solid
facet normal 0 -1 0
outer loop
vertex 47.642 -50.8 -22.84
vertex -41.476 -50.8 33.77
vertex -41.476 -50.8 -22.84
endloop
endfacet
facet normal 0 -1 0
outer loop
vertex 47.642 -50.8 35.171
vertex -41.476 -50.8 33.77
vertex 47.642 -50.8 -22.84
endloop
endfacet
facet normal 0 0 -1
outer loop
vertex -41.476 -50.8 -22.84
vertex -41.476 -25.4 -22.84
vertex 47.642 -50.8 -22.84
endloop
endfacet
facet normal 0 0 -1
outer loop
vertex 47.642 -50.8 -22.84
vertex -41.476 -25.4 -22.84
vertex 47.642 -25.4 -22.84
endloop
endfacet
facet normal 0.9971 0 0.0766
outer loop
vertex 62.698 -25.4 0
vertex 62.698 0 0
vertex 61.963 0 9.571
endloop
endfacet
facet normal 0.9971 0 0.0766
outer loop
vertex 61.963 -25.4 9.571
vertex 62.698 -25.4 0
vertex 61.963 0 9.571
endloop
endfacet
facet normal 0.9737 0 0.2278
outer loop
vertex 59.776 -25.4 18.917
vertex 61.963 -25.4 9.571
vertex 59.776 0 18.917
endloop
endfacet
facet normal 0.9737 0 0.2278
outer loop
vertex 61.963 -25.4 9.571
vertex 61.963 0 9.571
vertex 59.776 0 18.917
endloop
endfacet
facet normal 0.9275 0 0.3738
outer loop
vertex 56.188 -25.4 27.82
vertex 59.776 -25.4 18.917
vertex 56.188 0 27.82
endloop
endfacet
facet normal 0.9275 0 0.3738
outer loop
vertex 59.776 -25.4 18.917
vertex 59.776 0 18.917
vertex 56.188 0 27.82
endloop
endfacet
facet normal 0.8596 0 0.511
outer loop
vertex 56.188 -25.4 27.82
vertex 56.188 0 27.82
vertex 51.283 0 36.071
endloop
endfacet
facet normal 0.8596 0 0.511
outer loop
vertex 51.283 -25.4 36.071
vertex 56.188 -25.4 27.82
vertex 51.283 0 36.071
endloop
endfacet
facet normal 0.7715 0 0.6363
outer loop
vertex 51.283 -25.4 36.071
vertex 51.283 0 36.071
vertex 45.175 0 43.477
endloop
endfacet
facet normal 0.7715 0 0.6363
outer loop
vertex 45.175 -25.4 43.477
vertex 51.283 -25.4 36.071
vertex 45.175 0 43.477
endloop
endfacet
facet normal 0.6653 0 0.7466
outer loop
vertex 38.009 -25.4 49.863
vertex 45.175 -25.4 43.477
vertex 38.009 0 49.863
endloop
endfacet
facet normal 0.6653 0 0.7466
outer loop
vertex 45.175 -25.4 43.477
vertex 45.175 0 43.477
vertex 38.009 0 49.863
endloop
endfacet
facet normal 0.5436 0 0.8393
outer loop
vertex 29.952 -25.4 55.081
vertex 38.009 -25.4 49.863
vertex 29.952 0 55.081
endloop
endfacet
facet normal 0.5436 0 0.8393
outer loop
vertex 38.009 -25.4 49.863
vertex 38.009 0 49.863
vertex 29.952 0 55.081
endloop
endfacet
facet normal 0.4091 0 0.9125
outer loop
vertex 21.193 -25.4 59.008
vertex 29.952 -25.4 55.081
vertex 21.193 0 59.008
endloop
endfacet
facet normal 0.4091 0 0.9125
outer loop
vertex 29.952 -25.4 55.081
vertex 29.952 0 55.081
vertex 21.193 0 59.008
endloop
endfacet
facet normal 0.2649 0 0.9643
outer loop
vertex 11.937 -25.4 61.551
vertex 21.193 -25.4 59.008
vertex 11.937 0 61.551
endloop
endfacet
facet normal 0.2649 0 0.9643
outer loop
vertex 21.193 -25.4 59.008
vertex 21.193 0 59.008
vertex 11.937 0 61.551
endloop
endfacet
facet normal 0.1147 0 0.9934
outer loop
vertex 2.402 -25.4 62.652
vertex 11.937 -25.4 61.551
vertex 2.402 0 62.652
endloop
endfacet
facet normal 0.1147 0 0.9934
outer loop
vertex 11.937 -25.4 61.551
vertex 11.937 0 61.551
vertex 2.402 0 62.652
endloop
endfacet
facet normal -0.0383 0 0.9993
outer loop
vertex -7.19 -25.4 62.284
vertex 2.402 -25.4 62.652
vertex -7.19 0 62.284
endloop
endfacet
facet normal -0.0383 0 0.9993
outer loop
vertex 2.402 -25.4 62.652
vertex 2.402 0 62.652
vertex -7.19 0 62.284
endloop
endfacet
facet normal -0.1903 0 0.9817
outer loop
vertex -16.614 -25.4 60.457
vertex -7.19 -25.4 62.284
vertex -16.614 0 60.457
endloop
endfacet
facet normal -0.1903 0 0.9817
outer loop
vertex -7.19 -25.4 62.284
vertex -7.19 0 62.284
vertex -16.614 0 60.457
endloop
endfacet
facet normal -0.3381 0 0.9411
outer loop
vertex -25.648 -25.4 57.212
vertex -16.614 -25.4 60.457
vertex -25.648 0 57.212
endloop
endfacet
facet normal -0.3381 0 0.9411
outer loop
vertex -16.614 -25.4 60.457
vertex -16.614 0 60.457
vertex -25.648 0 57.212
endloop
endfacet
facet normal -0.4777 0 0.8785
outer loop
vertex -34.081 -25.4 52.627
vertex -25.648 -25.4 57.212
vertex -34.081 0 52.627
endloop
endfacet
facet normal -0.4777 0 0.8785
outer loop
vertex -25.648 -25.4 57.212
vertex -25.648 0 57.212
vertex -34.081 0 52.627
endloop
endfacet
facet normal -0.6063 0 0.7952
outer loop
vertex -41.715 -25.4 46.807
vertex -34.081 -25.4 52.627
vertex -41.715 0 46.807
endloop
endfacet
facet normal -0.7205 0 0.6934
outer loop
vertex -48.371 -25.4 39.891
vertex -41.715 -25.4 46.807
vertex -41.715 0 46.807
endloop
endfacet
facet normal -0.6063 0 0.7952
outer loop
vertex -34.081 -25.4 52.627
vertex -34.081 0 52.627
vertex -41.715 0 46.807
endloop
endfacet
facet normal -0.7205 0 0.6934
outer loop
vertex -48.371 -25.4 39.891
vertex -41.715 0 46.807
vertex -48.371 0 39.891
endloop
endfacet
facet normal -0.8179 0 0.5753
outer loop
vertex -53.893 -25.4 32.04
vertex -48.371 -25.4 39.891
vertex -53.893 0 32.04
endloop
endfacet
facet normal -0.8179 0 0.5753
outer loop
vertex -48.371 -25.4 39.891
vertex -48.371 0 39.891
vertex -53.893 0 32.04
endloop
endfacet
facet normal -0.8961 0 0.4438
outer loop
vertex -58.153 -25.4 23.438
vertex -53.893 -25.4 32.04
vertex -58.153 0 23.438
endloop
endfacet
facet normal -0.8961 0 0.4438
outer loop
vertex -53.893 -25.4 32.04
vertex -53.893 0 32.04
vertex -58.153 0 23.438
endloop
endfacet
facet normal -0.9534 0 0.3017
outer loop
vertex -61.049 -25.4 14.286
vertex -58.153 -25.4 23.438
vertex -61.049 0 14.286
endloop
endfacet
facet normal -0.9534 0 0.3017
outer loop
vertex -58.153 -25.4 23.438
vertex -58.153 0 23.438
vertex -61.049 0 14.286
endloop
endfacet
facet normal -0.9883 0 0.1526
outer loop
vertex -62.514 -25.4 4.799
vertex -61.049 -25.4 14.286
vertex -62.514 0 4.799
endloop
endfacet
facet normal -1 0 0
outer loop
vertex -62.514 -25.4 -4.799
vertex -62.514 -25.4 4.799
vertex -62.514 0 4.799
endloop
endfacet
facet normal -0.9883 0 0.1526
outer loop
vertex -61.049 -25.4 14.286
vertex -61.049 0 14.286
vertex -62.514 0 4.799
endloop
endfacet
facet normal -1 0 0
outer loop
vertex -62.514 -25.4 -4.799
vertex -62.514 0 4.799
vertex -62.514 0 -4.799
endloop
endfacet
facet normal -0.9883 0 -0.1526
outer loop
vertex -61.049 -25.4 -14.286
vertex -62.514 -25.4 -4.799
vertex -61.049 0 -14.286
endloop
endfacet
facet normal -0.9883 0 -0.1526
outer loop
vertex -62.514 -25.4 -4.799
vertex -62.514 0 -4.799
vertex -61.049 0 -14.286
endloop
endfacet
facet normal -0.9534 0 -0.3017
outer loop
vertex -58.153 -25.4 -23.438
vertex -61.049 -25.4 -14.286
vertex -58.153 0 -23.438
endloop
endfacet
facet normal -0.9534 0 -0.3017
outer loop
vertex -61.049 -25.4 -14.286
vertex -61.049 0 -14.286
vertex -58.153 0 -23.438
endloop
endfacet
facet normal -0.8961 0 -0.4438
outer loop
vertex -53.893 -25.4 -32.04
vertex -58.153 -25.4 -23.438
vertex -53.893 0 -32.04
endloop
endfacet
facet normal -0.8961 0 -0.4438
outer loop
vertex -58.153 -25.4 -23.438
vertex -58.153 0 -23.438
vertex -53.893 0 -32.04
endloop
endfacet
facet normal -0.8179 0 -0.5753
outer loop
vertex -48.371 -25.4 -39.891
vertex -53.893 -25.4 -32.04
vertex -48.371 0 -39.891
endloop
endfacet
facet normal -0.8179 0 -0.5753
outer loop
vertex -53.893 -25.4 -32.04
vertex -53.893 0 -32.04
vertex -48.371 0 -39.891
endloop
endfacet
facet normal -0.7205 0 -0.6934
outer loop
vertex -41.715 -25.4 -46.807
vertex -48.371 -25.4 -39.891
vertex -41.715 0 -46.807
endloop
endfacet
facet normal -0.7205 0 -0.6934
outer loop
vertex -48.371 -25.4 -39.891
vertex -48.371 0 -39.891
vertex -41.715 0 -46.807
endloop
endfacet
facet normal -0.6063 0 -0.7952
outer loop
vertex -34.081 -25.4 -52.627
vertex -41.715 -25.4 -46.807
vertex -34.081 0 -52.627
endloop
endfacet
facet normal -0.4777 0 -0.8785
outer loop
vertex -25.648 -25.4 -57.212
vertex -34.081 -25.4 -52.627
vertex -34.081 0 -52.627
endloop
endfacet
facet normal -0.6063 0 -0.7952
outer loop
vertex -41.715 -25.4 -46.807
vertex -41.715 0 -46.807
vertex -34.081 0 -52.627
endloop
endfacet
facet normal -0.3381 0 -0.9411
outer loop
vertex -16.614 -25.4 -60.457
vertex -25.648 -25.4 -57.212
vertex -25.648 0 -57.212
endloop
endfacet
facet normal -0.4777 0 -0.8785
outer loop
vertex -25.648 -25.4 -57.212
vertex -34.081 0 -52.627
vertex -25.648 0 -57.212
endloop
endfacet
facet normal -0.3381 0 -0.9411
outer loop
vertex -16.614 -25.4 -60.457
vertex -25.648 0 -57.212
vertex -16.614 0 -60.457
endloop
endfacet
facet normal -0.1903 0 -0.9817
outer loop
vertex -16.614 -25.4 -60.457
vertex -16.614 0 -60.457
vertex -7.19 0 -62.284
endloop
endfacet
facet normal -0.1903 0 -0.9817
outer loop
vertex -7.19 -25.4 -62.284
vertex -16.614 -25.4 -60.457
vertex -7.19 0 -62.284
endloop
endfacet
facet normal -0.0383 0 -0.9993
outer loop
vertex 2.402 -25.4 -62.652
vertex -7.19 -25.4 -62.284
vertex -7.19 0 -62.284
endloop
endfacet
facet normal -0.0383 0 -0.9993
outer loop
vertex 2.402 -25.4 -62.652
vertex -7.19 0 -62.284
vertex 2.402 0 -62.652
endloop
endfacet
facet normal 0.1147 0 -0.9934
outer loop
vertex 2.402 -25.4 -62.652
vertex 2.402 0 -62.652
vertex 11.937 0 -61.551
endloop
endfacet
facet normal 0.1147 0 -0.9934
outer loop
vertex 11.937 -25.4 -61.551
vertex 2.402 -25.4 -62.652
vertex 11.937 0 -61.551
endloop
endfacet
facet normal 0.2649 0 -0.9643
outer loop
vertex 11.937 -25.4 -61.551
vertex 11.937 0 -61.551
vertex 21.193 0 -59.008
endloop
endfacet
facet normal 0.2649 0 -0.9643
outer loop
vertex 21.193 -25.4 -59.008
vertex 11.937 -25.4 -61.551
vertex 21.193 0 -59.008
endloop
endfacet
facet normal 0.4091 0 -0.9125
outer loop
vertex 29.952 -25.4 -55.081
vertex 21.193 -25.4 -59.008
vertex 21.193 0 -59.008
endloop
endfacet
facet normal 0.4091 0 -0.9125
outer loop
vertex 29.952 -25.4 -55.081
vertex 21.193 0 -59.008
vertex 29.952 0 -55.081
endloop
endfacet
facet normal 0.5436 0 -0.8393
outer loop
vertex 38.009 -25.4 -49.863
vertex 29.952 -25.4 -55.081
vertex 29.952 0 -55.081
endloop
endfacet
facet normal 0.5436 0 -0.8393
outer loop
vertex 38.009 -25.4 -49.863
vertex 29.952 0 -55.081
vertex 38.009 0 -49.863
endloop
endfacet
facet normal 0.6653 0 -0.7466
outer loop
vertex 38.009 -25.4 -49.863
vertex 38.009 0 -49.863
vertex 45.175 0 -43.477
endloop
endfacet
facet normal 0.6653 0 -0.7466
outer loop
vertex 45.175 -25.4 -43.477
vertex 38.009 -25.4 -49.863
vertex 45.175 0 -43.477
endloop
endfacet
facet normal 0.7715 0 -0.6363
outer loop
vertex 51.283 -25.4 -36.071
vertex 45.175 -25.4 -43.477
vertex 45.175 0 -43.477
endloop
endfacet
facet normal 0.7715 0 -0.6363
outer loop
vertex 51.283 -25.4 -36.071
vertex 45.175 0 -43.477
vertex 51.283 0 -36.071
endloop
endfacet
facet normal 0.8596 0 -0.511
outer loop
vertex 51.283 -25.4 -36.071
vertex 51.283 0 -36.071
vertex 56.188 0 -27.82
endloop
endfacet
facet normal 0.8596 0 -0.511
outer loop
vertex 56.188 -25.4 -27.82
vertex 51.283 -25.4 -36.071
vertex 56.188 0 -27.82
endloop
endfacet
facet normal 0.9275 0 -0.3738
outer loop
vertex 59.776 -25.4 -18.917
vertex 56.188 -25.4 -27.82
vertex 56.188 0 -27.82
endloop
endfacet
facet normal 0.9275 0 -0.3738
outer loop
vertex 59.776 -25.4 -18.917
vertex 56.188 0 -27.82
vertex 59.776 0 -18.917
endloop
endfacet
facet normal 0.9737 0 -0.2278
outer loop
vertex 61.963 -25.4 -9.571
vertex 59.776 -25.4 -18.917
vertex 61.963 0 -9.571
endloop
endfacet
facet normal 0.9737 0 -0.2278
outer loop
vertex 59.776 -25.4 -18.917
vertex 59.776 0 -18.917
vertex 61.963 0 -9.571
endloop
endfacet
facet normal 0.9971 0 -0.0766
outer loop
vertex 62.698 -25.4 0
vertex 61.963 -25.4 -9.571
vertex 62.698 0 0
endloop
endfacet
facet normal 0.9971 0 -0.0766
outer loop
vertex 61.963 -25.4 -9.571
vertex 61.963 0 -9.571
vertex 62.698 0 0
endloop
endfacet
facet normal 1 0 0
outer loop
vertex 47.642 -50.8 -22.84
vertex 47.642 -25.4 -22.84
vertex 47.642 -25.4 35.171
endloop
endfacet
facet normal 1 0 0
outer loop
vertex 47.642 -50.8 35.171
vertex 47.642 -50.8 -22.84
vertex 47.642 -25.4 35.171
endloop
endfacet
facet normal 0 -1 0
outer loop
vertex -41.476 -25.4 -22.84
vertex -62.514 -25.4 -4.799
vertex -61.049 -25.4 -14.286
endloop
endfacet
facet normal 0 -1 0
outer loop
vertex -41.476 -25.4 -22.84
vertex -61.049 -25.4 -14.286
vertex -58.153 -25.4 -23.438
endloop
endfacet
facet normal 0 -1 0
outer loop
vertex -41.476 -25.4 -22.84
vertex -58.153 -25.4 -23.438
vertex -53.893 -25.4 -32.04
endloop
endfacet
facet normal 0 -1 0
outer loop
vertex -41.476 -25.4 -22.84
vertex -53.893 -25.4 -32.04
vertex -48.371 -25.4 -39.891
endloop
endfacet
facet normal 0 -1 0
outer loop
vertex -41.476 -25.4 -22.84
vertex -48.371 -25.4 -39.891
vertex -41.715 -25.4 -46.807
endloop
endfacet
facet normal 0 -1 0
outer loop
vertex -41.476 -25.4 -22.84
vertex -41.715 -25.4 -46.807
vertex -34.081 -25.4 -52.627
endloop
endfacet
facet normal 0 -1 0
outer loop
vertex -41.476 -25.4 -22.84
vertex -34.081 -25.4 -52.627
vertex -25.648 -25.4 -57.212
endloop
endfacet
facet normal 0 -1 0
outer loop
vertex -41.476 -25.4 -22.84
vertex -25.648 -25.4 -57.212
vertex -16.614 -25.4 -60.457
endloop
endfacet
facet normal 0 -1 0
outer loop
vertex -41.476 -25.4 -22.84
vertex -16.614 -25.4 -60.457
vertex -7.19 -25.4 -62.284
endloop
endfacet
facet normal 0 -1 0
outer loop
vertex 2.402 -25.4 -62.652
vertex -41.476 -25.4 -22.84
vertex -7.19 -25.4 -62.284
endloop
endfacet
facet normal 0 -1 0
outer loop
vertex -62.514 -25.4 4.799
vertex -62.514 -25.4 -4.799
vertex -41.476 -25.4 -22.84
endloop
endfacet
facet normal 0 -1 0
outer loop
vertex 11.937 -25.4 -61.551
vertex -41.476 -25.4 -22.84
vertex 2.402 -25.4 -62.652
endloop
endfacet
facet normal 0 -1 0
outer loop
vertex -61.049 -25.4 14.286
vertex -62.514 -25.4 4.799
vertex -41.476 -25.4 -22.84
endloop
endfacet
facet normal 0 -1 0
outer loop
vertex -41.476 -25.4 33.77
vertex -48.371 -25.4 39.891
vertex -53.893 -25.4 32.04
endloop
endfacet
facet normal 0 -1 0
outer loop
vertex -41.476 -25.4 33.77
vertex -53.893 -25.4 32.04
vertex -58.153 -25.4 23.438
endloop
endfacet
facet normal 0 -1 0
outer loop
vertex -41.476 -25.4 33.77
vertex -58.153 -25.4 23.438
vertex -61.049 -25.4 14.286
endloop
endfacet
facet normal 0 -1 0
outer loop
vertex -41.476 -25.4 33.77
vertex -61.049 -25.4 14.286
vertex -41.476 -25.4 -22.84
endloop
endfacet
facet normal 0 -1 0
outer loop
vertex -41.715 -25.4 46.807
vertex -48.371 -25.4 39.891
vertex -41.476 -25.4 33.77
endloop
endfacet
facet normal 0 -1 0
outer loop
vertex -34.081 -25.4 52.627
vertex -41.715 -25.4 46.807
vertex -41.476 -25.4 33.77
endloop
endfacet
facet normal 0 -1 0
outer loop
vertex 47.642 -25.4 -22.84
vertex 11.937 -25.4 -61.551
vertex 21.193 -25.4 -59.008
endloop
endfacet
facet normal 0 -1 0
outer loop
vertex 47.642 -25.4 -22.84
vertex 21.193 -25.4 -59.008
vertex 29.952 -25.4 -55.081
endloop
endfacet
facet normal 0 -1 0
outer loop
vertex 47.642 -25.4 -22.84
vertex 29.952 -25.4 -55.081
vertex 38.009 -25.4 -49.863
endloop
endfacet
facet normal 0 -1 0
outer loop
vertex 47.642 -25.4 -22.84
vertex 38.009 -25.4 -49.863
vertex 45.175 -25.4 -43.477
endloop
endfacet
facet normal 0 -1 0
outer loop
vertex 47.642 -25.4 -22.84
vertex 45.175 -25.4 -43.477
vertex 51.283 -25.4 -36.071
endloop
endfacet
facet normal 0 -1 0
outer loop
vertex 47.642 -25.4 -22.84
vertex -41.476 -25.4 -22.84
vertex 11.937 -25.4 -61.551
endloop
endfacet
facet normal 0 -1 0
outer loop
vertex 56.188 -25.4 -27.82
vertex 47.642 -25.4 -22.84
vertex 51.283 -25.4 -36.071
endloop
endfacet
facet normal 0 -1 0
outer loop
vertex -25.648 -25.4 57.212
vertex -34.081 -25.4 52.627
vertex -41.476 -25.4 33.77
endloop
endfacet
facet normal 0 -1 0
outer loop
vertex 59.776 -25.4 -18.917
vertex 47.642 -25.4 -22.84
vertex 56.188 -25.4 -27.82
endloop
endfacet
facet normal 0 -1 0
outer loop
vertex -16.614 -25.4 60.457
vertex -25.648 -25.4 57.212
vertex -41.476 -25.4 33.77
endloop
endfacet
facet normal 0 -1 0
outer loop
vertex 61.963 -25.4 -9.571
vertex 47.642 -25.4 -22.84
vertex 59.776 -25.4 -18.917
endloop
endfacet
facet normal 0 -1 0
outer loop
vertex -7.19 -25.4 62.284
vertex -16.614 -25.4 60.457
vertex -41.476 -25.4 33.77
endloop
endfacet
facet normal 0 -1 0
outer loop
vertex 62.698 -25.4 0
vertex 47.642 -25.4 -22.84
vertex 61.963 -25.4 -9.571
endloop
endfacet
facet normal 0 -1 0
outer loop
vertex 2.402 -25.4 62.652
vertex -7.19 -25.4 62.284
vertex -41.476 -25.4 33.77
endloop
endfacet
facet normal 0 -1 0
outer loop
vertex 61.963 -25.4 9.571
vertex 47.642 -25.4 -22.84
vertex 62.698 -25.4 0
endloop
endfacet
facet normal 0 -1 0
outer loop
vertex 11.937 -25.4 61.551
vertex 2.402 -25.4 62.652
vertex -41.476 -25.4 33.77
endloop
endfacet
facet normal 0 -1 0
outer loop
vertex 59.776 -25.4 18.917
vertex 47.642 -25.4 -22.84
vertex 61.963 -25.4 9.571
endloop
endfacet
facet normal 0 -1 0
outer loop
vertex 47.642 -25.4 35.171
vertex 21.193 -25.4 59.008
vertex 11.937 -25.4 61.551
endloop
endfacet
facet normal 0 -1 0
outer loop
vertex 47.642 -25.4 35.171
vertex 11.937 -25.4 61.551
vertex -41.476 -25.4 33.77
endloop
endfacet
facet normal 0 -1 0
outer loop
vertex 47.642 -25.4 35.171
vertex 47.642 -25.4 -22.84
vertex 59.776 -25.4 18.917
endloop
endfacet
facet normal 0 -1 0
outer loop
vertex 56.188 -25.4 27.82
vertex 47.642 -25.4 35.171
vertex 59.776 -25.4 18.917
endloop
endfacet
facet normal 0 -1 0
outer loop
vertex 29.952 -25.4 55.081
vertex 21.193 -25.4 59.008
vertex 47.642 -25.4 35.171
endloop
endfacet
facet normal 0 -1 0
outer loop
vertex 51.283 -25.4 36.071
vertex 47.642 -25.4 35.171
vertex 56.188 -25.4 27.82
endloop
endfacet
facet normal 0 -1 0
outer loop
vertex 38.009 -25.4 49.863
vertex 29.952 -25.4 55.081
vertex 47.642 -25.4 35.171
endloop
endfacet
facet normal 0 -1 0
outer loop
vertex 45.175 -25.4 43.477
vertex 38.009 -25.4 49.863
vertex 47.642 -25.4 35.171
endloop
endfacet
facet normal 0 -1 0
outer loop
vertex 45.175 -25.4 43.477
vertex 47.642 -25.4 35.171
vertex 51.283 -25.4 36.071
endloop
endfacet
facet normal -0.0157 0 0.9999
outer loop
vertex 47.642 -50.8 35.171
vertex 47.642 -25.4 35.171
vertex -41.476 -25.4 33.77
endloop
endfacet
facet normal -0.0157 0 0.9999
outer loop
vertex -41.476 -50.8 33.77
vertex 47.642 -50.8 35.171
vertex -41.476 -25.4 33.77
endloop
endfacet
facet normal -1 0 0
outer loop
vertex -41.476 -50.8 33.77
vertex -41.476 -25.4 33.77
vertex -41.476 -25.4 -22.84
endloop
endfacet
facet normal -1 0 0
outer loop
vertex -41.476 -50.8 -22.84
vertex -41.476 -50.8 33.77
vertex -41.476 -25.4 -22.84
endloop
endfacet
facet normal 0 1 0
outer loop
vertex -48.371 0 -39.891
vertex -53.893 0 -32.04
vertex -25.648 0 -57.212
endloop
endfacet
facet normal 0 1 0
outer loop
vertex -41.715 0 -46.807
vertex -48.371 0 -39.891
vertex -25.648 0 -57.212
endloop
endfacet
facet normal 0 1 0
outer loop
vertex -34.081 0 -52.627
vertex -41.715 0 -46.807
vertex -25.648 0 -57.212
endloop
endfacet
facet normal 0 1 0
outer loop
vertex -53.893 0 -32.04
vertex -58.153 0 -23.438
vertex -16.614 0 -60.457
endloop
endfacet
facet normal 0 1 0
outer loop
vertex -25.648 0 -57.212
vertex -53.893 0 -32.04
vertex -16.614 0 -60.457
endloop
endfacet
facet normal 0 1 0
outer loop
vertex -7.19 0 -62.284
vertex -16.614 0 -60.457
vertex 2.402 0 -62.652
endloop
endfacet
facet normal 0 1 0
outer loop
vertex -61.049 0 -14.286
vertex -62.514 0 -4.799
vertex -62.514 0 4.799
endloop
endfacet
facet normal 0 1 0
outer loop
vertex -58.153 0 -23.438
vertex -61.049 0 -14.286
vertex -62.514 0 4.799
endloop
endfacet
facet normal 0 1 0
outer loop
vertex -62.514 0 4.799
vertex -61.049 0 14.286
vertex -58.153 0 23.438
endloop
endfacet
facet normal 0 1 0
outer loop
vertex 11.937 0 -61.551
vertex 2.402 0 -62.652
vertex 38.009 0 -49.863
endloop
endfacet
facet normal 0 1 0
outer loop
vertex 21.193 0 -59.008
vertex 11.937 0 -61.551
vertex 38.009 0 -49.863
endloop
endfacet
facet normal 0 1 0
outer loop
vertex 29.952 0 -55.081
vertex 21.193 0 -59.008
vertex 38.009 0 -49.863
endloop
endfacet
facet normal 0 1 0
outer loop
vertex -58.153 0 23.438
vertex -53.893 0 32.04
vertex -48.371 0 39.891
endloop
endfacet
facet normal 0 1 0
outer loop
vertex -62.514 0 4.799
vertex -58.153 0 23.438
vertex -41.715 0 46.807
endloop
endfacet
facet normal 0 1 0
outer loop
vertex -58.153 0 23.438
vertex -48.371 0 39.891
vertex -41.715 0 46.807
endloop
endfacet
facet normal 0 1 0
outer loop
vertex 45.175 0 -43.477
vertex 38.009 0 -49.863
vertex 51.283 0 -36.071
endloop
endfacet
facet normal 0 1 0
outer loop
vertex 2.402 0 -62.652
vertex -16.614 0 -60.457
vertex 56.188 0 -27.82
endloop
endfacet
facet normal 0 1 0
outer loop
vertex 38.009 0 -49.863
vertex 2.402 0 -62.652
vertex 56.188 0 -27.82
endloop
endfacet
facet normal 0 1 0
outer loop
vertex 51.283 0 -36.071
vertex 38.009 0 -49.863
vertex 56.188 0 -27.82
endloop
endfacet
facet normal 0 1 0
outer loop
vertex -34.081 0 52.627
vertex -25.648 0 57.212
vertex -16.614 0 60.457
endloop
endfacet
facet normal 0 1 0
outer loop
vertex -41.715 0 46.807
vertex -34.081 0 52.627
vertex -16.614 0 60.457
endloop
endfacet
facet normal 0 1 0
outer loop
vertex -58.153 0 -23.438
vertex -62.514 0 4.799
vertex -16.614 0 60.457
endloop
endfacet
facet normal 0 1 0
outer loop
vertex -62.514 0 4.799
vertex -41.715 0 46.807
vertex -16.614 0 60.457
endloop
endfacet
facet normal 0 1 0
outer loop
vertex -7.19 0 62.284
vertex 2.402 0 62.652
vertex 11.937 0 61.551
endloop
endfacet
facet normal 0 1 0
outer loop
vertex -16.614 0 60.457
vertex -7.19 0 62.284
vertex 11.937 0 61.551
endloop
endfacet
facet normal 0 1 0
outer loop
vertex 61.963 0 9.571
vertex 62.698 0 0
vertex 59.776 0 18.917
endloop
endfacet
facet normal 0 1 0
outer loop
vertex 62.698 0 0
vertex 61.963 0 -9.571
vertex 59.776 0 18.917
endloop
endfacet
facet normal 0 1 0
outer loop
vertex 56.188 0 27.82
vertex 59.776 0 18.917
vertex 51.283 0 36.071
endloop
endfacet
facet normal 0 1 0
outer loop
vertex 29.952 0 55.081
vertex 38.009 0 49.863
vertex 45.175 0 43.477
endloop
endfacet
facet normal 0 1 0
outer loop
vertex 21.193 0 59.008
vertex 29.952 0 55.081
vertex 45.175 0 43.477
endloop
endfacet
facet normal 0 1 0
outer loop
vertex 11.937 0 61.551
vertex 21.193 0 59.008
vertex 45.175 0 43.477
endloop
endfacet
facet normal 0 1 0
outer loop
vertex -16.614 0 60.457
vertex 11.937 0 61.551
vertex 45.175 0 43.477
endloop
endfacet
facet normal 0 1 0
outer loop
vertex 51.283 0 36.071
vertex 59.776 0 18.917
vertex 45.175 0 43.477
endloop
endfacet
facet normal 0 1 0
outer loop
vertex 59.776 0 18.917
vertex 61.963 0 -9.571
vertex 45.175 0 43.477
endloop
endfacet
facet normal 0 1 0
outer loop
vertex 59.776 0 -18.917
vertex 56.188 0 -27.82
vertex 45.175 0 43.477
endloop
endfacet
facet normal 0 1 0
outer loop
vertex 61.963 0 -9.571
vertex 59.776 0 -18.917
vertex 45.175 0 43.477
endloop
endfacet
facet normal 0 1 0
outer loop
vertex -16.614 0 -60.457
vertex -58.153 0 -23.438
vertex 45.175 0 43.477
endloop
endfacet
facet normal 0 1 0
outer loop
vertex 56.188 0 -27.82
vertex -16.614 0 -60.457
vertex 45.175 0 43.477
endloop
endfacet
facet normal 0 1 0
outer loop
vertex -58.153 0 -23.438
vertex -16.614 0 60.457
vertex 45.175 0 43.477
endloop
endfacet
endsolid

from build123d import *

# Parameters (mm, degrees)
F1_DEPTH = 0.0254
F3_R     = 62.6980879208
F4_DEPTH = 25.4
F6_DEPTH = 25.4


with BuildPart() as f1:
    # F0 (on Front) → F1 (new body)
    with BuildSketch(Plane.XZ):
        Polygon((47.9219257832, 17.5153240561), (-52.4058490992, 55.9089146554), (-52.4058490992, -55.068179965), align=None)
    extrude(amount=F1_DEPTH)


with BuildPart() as f4:
    # F3 (on Front) → F4 (new body)
    with BuildSketch(Plane.XZ):
        Circle(F3_R)
    extrude(amount=F4_DEPTH)

    # F5 (on face) → F6 (join)
    with BuildSketch(Plane.XZ.offset(25.4)):
        Polygon((47.6416796446, 35.1707711816), (-41.4762869477, 33.769544214), (-41.4762869477, -22.8399839252), (47.6416796446, -22.8399839252), align=None)
    extrude(amount=F6_DEPTH)


solid = f4.part
